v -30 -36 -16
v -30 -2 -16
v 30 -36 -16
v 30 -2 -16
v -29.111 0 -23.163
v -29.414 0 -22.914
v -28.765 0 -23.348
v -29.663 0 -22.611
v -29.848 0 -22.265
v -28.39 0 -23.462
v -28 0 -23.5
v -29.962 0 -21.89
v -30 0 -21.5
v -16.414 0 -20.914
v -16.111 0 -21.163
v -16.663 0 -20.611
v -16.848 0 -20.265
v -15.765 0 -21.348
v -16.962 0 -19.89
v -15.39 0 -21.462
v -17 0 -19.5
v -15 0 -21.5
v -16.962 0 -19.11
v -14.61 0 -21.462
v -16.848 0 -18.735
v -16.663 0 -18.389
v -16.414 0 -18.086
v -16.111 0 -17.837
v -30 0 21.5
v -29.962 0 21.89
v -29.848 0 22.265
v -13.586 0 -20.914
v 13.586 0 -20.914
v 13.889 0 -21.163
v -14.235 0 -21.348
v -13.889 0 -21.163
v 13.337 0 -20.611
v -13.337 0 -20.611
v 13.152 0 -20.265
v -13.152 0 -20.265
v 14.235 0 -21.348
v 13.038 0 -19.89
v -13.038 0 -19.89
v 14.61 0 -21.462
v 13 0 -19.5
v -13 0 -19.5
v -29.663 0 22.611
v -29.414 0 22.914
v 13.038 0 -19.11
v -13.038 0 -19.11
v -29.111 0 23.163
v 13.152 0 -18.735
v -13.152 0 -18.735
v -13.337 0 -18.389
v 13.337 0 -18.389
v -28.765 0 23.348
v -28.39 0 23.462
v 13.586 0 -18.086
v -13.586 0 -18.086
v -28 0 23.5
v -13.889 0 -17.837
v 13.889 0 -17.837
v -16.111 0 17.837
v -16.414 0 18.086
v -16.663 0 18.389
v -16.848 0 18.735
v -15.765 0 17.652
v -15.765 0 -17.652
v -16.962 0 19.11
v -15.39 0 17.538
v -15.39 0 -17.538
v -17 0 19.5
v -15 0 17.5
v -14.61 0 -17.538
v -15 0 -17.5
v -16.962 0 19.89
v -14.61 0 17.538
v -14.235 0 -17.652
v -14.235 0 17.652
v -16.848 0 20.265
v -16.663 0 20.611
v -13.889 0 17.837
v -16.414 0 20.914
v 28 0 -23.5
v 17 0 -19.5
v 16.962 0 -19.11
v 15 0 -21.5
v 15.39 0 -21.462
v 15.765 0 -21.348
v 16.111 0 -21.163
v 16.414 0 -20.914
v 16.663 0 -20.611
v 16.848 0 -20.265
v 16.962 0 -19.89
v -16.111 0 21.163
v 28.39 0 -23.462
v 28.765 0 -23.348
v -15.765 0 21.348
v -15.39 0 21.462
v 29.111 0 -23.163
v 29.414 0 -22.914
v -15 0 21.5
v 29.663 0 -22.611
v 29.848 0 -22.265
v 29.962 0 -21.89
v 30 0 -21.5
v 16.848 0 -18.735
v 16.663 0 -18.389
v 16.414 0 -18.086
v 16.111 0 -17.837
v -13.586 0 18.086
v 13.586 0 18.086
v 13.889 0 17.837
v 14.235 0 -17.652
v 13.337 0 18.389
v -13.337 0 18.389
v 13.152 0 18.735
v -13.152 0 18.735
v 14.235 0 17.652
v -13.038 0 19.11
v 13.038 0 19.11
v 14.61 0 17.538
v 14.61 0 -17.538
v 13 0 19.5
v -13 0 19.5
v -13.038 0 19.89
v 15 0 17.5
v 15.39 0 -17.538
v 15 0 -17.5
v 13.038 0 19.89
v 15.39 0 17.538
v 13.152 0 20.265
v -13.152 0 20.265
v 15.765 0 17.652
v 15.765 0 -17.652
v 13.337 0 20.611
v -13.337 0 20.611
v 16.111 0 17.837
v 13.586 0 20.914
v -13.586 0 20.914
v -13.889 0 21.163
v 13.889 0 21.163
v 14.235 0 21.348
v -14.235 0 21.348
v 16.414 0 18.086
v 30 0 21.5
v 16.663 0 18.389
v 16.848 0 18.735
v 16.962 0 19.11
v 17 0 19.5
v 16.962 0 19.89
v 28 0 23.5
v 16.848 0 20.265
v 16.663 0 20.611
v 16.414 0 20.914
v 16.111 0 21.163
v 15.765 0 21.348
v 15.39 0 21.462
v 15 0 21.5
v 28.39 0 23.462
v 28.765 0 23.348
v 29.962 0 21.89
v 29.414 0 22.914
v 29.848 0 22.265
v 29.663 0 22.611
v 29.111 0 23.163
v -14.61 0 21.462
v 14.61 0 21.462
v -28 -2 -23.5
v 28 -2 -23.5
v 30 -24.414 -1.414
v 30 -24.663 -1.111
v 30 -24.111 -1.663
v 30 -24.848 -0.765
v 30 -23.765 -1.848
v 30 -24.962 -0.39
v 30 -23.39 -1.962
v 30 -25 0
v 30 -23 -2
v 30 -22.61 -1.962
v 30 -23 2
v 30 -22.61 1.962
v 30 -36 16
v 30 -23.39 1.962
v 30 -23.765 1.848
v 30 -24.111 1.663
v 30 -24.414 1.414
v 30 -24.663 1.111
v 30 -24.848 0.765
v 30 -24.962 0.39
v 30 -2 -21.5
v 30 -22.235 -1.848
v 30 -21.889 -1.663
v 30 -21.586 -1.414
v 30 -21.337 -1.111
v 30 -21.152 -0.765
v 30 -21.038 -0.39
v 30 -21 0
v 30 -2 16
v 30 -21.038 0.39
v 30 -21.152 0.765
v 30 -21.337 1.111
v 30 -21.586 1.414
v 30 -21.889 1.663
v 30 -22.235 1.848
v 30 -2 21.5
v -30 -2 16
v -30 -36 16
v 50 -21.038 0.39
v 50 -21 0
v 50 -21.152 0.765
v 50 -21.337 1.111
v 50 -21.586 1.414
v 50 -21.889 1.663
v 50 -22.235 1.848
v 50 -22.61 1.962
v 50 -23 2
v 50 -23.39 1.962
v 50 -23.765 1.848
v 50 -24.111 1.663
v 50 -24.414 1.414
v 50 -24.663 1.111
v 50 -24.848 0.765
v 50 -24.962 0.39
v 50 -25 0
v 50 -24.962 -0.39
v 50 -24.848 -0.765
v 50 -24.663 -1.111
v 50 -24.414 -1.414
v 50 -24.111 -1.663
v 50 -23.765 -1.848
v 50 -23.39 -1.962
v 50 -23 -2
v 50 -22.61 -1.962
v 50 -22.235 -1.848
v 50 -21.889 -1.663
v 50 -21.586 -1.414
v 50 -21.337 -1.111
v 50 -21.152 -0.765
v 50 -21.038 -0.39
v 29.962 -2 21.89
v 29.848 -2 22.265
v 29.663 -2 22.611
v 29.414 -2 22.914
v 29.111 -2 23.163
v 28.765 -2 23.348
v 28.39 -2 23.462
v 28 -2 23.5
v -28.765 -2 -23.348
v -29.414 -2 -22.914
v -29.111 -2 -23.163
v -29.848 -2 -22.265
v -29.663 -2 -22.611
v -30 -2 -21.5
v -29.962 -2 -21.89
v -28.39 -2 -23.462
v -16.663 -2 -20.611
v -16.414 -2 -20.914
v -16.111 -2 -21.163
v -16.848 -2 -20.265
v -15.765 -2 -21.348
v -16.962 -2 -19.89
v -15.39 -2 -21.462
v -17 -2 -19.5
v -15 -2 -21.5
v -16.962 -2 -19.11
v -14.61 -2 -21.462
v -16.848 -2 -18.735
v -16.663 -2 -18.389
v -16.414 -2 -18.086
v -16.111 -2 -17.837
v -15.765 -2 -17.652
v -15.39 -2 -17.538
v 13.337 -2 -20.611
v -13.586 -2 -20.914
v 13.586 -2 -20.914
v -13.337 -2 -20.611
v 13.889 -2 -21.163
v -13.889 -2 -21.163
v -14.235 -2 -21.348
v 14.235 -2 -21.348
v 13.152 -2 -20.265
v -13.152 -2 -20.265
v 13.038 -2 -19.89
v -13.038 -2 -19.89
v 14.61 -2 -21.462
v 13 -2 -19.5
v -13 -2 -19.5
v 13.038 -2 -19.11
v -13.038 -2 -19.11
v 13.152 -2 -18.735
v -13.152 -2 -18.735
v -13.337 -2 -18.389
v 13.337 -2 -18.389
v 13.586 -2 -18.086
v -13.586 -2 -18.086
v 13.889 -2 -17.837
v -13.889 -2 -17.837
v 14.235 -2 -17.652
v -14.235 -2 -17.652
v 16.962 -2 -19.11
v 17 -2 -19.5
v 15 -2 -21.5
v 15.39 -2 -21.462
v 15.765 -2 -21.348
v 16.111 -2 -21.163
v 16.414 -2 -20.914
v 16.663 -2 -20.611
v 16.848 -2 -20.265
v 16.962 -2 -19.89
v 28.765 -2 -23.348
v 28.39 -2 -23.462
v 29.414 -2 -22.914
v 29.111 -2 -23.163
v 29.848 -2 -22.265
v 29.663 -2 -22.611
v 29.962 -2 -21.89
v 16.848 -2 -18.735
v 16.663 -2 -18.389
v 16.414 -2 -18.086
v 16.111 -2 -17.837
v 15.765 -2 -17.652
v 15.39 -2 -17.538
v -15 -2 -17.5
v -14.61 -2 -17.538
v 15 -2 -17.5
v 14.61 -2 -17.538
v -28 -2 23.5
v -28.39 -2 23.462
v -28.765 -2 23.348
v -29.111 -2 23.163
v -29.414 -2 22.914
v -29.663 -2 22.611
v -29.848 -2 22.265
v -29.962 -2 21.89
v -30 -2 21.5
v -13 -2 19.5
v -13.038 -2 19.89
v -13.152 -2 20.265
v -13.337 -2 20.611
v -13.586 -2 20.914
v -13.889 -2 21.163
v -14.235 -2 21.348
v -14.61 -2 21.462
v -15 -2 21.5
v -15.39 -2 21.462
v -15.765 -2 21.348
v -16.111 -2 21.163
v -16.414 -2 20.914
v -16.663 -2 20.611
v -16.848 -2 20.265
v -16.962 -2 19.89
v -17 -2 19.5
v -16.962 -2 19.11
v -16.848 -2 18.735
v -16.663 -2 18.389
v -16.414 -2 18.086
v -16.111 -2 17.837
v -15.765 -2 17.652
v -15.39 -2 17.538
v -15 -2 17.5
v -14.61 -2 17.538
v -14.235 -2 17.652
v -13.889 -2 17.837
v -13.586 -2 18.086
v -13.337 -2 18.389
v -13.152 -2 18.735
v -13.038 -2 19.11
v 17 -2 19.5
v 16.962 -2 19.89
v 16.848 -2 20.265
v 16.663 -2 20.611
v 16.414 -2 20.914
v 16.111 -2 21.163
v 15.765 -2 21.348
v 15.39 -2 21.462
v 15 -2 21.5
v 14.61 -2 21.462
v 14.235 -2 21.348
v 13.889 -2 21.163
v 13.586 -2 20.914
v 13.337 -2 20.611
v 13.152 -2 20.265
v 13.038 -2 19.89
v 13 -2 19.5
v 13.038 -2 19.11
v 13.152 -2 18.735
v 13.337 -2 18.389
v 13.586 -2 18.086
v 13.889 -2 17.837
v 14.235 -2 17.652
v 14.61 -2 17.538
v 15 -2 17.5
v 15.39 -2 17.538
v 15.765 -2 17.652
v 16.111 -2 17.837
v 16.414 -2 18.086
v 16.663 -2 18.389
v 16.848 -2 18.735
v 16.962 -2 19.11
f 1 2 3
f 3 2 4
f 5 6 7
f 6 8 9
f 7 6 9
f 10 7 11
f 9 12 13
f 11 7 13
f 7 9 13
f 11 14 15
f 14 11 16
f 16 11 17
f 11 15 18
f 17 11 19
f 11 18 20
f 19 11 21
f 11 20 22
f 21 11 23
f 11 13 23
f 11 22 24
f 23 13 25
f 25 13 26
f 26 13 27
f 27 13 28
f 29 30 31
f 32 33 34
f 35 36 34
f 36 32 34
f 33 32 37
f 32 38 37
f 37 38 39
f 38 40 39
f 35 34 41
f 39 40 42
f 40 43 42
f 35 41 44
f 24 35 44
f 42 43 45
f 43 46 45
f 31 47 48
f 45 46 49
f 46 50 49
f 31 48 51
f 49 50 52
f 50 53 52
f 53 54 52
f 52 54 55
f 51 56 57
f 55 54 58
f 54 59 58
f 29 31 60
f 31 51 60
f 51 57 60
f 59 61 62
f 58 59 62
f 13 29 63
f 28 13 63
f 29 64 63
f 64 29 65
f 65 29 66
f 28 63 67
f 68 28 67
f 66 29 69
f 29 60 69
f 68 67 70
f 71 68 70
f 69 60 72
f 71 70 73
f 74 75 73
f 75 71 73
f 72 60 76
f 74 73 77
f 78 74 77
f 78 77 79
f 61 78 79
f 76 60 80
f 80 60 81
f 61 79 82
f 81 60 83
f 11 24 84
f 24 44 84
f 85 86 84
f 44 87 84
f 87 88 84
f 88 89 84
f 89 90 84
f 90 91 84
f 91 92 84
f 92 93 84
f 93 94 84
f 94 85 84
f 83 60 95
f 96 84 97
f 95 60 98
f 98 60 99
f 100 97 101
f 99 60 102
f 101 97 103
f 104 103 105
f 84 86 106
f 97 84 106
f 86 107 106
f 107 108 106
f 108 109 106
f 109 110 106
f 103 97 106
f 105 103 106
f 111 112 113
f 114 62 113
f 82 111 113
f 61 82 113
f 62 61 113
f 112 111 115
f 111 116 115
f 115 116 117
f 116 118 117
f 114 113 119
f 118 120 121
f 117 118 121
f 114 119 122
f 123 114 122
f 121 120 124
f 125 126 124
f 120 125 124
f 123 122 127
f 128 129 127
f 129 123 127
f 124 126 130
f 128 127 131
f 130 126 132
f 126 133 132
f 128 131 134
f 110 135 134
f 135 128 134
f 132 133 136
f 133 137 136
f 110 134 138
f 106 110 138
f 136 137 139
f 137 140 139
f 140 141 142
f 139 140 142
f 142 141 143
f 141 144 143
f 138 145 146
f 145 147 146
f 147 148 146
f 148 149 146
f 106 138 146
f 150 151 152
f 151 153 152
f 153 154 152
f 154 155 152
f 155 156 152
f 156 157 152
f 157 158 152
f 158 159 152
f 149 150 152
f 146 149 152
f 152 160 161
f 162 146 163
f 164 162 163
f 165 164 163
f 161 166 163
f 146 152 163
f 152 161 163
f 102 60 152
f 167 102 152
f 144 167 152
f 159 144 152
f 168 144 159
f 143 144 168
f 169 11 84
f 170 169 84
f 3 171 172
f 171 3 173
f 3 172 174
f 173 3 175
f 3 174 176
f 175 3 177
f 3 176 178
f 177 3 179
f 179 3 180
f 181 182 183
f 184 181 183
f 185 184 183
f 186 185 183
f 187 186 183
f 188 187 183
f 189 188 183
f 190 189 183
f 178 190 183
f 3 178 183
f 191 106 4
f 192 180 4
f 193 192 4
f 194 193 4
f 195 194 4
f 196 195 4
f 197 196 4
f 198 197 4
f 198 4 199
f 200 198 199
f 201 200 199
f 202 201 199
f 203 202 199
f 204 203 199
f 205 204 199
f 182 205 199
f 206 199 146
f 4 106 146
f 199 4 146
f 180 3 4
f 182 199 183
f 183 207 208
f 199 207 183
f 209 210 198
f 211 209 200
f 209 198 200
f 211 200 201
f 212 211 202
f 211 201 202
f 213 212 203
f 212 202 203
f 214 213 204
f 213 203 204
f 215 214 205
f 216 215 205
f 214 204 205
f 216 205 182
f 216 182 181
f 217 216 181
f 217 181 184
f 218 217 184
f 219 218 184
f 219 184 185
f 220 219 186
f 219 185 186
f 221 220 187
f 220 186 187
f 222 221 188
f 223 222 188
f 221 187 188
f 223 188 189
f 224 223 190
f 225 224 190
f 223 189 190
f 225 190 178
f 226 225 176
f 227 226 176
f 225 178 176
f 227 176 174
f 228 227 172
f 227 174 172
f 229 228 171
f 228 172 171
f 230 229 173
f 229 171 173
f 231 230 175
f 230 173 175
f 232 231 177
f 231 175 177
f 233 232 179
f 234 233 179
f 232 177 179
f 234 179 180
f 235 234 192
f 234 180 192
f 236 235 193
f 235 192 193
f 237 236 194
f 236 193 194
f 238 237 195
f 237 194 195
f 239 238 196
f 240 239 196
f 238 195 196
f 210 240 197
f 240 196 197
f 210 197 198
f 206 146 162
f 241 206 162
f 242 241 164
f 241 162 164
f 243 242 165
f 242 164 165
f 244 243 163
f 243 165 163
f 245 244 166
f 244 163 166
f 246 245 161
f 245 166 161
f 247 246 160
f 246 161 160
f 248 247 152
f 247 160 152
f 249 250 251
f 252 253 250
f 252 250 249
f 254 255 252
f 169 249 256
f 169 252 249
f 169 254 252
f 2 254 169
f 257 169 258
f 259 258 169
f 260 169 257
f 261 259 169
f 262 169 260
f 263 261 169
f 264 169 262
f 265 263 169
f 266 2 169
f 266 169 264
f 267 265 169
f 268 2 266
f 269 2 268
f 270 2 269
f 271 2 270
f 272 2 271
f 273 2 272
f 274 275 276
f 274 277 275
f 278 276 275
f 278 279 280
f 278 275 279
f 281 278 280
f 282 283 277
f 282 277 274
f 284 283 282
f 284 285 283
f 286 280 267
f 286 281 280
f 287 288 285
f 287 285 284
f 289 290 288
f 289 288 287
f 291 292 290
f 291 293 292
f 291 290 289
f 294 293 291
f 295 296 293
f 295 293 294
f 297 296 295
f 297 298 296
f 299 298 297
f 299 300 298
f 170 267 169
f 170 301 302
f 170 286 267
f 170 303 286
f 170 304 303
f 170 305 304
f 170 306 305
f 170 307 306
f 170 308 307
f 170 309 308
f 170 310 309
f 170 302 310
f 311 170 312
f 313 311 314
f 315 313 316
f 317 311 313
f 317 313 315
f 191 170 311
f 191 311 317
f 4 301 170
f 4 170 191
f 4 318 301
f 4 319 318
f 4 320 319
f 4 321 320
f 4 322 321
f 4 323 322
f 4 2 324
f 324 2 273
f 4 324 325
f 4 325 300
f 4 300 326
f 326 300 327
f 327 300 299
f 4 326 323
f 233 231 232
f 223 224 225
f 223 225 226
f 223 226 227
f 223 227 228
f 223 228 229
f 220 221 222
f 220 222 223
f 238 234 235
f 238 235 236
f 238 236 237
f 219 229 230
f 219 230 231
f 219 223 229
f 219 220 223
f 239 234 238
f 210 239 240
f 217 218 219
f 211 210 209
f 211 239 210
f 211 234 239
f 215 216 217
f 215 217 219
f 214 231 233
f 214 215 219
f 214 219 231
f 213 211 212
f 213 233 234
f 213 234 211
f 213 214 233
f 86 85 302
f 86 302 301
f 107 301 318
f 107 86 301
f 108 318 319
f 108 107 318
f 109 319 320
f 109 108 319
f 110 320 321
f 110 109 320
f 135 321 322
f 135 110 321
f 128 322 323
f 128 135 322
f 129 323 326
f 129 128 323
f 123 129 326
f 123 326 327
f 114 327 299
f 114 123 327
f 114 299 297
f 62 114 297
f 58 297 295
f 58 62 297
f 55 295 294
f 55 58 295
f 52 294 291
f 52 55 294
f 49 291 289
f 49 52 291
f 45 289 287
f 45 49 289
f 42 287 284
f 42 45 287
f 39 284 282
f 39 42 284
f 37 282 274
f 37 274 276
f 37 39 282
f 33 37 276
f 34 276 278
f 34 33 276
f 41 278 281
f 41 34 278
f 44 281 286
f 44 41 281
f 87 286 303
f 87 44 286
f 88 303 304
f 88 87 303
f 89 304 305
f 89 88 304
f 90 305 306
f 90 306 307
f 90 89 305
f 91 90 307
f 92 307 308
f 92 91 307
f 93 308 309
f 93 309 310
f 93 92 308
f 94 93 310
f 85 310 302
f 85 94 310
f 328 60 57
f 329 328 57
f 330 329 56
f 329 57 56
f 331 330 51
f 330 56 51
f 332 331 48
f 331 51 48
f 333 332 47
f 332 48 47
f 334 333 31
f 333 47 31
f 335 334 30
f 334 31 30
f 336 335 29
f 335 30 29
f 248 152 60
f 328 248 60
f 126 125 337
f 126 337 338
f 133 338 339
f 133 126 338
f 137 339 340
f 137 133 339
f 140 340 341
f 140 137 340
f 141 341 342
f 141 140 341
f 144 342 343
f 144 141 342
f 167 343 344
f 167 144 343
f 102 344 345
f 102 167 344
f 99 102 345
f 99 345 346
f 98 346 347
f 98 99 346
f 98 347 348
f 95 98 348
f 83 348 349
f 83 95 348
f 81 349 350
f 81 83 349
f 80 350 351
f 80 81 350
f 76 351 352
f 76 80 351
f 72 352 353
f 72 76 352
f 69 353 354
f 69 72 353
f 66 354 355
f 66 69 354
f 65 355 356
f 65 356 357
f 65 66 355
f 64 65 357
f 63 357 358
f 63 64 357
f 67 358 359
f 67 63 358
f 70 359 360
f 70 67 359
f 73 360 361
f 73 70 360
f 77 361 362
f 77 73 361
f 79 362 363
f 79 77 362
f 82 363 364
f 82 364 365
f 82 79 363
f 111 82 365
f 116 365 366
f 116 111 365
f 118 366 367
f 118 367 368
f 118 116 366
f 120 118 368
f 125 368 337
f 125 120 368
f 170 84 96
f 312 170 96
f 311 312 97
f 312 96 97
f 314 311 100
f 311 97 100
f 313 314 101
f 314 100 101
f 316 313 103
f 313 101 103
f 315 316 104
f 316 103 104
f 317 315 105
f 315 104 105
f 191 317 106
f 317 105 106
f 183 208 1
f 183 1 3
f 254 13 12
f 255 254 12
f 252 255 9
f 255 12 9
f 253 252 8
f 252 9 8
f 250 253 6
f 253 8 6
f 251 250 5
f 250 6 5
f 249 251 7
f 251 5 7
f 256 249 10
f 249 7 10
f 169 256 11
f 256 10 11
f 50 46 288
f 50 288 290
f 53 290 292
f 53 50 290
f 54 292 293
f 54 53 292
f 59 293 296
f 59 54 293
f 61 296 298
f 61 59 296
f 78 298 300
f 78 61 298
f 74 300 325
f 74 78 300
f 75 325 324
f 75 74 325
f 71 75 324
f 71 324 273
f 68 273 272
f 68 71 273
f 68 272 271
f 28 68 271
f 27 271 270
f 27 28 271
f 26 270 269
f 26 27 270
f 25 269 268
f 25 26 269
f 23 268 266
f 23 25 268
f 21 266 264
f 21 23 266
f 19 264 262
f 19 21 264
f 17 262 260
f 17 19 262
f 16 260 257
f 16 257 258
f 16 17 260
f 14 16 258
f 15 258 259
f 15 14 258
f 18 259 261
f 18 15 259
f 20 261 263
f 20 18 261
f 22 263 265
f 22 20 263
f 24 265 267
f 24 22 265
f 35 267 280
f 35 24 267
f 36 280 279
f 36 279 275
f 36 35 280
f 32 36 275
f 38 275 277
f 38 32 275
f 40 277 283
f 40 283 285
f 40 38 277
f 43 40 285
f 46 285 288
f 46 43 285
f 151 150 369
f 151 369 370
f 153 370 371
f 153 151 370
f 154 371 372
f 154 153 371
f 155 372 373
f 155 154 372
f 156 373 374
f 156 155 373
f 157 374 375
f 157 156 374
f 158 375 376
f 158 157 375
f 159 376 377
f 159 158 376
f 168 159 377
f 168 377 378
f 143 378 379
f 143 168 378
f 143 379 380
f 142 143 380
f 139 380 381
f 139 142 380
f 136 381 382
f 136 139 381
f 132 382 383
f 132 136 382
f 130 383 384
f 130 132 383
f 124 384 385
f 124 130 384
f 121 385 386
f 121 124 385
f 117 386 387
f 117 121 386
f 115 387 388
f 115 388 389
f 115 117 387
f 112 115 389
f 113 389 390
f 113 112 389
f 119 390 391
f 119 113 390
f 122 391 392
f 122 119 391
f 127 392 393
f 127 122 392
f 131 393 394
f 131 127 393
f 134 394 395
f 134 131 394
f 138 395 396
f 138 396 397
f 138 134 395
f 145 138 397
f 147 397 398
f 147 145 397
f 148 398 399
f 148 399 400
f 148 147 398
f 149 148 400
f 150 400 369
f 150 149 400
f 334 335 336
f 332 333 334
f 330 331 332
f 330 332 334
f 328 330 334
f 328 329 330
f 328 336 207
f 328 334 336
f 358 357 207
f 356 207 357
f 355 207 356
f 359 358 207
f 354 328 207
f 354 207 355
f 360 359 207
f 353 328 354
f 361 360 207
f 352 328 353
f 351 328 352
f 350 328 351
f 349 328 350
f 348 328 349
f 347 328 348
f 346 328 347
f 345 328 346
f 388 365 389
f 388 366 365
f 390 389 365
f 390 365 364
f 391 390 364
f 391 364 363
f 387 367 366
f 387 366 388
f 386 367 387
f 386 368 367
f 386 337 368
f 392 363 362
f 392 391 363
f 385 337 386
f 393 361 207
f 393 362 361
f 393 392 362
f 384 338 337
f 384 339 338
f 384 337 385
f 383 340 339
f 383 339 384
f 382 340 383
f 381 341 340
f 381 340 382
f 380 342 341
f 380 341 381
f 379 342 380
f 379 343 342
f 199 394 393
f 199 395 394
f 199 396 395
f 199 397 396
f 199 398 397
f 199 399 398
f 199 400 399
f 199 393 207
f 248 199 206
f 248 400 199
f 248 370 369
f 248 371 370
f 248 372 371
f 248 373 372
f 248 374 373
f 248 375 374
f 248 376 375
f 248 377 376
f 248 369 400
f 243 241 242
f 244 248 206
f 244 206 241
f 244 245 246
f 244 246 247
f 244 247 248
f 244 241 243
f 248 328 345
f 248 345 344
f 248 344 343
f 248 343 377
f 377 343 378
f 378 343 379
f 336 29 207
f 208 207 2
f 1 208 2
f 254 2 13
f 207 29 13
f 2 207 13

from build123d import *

# Parameters (mm, degrees)
F0_R     = 2
F1_DEPTH = 2
F2_W     = 60
F2_H     = 32
F3_DEPTH = 36
F4_R     = 2
F5_DEPTH = 20


with BuildPart() as f1:
    # F0 (on Front) → F1 (new body)
    with BuildSketch(Plane.XZ):
        with BuildLine():
            ThreePointArc((30, 21.5), (29.414214, 22.914214), (28, 23.5))
            Line((28, 23.5), (-28, 23.5))
            ThreePointArc((-28, 23.5), (-29.414214, 22.914214), (-30, 21.5))
            Line((-30, 21.5), (-30, -21.5))
            ThreePointArc((-30, -21.5), (-29.414214, -22.914214), (-28, -23.5))
            Line((-28, -23.5), (28, -23.5))
            ThreePointArc((28, -23.5), (29.414214, -22.914214), (30, -21.5))
            Line((30, -21.5), (30, 21.5))
        make_face()
        with Locations((-15, -19.5)):
            Circle(F0_R, mode=Mode.SUBTRACT)
        with Locations((15, -19.5)):
            Circle(F0_R, mode=Mode.SUBTRACT)
        with Locations((-15, 19.5)):
            Circle(F0_R, mode=Mode.SUBTRACT)
        with Locations((15, 19.5)):
            Circle(F0_R, mode=Mode.SUBTRACT)
    extrude(amount=F1_DEPTH)

    # F2 (on Front) → F3 (join)
    with BuildSketch(Plane.XZ):
        Rectangle(F2_W, F2_H)
    extrude(amount=F3_DEPTH)

    # F4 (on face) → F5 (join)
    with BuildSketch(Plane.YZ.offset(30)):
        with Locations((-23, 0)):
            Circle(F4_R)
    extrude(amount=F5_DEPTH)


solid = f1.part
